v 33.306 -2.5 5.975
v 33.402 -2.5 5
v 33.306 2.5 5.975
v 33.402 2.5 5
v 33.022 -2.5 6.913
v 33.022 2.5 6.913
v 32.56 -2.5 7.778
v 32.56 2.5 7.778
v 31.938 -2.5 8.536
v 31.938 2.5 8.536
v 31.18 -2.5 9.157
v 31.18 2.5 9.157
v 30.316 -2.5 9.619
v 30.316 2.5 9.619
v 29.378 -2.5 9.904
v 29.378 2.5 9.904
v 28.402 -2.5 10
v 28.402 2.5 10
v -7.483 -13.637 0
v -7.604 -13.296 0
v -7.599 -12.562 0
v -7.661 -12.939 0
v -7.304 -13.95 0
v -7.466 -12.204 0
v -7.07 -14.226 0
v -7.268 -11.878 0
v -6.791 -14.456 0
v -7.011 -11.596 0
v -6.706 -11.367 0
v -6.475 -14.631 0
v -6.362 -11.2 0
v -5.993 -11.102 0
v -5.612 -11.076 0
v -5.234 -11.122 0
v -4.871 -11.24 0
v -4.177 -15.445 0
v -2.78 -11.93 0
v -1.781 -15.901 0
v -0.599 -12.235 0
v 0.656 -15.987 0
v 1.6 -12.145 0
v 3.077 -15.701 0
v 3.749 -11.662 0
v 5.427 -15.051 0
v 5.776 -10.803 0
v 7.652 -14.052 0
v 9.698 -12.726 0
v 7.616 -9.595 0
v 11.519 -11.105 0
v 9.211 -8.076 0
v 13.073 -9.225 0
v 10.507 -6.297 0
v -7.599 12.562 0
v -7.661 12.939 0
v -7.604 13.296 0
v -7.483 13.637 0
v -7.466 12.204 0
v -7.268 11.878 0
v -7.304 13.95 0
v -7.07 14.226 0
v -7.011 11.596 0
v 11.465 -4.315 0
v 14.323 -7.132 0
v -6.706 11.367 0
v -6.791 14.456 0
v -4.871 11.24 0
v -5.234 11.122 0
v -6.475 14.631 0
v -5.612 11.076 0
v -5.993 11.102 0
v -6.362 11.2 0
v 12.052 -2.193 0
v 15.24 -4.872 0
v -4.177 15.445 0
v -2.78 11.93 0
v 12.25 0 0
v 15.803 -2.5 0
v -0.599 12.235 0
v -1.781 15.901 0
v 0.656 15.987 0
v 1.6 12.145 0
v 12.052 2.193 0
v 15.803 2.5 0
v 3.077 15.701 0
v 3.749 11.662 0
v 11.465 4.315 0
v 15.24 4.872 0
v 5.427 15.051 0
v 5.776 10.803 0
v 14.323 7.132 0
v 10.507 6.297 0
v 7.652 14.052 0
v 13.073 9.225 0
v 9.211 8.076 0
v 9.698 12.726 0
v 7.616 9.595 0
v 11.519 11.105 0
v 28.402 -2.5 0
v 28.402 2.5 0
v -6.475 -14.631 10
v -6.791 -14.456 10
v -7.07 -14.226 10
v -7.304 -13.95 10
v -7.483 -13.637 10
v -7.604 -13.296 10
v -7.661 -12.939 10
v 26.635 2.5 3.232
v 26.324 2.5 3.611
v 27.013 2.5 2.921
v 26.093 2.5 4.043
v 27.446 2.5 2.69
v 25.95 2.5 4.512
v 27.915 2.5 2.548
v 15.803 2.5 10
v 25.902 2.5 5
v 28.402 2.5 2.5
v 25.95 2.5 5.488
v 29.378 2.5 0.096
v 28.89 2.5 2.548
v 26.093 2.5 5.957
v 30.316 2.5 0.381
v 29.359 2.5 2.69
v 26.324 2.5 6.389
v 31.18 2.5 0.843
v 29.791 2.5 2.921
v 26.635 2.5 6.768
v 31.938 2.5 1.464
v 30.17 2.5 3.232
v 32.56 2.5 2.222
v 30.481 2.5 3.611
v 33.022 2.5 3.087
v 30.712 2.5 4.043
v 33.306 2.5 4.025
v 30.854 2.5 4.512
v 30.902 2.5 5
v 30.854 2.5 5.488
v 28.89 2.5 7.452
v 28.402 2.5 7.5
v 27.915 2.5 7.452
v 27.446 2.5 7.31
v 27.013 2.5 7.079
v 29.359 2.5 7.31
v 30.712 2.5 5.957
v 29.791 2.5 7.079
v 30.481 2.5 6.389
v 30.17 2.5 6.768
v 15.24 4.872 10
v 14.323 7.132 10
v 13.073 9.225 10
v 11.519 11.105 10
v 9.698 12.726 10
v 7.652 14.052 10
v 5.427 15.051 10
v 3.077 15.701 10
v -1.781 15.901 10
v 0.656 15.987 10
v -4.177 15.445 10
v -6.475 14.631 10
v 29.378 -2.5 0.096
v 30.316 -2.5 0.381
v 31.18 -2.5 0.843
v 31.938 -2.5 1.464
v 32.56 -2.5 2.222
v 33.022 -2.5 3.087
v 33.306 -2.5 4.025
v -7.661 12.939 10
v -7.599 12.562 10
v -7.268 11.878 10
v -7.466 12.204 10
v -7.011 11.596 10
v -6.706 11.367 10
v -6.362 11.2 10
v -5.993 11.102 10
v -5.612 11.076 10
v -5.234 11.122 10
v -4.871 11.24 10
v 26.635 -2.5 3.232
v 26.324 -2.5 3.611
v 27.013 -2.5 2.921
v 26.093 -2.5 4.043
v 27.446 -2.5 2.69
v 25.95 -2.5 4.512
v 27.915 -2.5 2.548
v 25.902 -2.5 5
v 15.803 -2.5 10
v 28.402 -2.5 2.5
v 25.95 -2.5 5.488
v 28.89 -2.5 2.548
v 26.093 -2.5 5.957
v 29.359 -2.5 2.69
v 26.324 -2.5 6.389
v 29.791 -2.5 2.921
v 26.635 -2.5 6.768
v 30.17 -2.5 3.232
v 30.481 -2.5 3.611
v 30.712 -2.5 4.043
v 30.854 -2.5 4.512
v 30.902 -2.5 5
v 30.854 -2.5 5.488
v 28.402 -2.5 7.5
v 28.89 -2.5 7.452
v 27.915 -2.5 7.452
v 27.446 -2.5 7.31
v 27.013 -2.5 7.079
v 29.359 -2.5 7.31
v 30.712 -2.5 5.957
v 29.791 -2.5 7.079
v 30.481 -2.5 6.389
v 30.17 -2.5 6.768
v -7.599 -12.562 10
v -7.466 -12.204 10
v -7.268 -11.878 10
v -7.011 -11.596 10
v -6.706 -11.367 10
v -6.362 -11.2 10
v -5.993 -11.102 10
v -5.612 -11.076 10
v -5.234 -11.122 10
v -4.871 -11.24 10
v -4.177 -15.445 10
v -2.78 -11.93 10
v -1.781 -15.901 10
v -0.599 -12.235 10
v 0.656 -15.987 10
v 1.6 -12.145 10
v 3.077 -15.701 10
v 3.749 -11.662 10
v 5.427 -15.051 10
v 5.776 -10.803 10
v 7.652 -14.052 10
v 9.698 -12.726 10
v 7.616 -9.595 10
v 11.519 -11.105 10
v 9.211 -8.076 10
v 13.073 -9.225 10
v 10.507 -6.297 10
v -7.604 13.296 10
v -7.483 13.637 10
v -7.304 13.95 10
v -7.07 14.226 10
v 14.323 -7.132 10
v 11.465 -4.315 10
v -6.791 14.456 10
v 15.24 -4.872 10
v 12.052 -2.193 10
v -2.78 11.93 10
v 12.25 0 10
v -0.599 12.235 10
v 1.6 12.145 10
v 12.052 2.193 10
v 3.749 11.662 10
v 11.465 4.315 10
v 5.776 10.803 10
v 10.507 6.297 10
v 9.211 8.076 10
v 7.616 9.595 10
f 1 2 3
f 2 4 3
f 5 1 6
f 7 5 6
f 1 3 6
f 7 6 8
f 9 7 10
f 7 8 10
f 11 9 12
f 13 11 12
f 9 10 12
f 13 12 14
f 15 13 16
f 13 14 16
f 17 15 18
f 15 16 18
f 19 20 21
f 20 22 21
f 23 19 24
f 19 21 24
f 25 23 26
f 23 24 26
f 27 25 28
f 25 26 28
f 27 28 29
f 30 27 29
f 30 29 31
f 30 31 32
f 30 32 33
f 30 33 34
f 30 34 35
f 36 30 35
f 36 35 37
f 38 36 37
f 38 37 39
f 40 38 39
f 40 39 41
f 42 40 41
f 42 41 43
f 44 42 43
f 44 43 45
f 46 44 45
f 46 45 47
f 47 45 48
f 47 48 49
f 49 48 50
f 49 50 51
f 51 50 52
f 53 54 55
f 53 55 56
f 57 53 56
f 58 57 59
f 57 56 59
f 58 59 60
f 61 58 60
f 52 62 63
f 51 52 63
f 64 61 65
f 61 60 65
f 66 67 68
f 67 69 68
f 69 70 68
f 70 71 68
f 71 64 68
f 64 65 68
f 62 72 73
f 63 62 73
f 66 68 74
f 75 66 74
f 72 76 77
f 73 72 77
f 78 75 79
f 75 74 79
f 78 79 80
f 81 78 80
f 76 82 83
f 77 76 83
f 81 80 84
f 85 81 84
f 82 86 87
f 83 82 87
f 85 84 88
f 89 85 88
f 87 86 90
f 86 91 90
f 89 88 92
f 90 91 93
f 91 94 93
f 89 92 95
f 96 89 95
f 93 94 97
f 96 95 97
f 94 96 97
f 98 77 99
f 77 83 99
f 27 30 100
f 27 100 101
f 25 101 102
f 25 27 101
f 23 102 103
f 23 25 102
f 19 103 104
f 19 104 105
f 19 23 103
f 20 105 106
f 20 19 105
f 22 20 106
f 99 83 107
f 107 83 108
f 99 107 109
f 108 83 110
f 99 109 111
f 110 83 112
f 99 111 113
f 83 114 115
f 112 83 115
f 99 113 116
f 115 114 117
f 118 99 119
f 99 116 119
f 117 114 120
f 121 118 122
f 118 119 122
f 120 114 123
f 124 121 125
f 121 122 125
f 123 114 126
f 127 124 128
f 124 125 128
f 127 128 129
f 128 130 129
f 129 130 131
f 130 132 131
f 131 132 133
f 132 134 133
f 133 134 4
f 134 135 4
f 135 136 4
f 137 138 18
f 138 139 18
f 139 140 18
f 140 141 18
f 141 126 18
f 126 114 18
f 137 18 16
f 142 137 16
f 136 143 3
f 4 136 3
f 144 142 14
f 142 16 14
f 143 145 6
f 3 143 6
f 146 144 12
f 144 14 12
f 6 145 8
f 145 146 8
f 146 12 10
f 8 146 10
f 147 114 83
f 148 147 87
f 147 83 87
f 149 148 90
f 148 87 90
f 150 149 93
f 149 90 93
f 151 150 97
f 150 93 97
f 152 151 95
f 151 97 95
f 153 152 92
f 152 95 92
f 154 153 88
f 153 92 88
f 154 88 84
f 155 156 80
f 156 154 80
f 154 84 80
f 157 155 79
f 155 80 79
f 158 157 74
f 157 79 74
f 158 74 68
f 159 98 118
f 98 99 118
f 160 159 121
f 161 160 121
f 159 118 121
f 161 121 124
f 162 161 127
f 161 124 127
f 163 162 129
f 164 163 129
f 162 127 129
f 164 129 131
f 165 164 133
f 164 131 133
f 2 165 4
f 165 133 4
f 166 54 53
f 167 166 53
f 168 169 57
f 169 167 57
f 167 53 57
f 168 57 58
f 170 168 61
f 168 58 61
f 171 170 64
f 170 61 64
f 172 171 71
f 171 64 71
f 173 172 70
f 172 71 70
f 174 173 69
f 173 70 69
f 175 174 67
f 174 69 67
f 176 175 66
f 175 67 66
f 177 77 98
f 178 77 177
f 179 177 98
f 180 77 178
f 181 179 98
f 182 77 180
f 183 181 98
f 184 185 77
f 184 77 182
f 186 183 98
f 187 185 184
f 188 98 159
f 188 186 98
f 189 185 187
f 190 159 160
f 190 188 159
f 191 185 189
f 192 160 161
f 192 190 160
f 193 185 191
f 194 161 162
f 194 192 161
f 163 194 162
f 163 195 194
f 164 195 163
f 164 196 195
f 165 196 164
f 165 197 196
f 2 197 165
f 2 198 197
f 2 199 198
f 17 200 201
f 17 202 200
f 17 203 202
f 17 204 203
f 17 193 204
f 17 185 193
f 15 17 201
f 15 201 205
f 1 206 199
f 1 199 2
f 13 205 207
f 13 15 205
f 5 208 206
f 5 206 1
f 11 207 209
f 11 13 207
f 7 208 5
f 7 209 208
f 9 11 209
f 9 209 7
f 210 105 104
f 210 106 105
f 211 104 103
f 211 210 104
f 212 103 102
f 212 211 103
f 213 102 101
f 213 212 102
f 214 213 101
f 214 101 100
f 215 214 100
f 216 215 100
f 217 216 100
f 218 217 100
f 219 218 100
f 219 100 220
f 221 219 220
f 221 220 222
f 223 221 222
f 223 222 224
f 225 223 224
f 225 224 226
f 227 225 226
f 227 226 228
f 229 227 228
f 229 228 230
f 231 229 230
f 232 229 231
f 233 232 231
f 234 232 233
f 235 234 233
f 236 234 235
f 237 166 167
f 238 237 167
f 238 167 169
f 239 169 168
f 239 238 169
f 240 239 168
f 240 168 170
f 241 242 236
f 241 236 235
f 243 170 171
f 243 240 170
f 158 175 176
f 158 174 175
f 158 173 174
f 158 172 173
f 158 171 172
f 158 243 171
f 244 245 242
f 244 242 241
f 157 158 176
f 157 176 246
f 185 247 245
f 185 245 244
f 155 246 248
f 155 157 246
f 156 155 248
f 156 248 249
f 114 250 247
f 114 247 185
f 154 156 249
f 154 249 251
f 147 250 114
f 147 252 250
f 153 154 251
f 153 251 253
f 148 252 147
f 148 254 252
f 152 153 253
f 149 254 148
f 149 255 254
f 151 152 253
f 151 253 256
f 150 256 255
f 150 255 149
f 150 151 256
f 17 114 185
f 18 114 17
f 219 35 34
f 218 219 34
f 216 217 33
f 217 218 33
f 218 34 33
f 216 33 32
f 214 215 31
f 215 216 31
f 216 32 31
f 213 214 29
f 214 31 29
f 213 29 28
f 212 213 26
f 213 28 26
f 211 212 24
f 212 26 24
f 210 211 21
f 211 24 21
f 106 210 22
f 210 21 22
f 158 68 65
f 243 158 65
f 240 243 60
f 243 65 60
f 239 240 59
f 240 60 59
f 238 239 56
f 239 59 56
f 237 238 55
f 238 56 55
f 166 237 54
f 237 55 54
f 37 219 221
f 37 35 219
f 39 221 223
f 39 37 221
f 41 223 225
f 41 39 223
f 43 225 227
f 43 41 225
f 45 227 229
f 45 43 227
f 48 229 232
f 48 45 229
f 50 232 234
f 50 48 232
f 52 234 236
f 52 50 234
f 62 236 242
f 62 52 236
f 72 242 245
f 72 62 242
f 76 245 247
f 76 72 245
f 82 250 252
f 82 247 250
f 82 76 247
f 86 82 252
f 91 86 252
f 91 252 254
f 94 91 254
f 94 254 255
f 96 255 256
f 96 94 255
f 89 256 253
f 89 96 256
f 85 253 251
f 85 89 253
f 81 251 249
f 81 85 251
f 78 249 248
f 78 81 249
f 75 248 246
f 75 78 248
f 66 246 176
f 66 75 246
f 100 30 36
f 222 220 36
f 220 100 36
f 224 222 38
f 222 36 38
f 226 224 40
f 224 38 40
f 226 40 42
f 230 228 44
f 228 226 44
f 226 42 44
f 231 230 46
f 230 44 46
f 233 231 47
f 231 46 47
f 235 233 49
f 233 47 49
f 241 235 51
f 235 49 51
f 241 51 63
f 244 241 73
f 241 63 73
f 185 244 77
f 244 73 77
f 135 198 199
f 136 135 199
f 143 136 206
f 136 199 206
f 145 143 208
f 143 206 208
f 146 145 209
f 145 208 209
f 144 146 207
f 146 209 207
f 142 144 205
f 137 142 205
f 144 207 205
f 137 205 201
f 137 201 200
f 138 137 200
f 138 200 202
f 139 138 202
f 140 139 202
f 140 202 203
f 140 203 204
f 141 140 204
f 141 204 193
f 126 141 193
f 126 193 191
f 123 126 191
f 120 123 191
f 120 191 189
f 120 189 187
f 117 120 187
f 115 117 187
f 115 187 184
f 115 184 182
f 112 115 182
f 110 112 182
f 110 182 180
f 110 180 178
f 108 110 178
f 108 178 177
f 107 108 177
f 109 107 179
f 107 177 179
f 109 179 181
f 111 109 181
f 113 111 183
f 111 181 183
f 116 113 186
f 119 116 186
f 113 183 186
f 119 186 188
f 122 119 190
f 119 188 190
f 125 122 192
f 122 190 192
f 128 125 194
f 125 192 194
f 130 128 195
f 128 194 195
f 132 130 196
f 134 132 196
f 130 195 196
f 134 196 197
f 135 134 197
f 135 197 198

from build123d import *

# Parameters (mm, degrees)
F0_R        = 16
F0_R_2      = 12.25
F1_DEPTH    = 10
F2_W        = 11.453170795
F2_H        = 32.4866687879
F3_DEPTH    = 10.001
F4_T1_DEPTH = 27.6008886653
F4_T3_DEPTH = 16.6375565979
F5_W        = 20
F5_H        = 5
F6_DEPTH    = 10
F7_R        = 2.5
F8_DEPTH    = 18.501
F9_R        = 4.99999


# Not quite as in the source:
# - a fillet or chamfer that OpenCascade refuses, or shapes differently, is made with other operations: its cross-section is extruded or revolved along the edge and cut away or added
# - a fillet or chamfer is up to 0.001 mm smaller than in the source, because OpenCascade refuses the exact size


with BuildPart() as f1:
    # F0 (on Top) → F1 (new body)
    with BuildSketch(Plane.XY):
        Circle(F0_R)
        Circle(F0_R_2, mode=Mode.SUBTRACT)
    extrude(amount=F1_DEPTH)

    # F2 (on face) → F3 (cut, through all)
    with BuildSketch(Plane.XY.offset(10)):
        with Locations((-13.3922861423, 0.2399678342)):
            Rectangle(F2_W, F2_H)
    extrude(amount=-F3_DEPTH, mode=Mode.SUBTRACT)

    # F4: fillet of radius 2 on 4 edges, made by hand

    # F4_s2 → F4_t1 (cut)
    with BuildSketch(Plane.XY.offset(-8.8004443327)):
        with BuildLine():
            ThreePointArc((-7.6657007448, 13.0752565967), (-6.7633409093, 11.4033755993), (-4.8705146754, 11.2401328638))
            ThreePointArc((-4.8705146754, 11.2401328638), (-6.3244783193, 10.491114049), (-7.6657007448, 9.5550788637))
            Line((-7.6657007448, 9.5550788637), (-7.6657007448, 13.0752565967))
        make_face()
        with BuildLine():
            ThreePointArc((-4.8705146754, -11.2401328638), (-6.7633409093, -11.4033755993), (-7.6657007448, -13.0752565967))
            Line((-7.6657007448, -13.0752565967), (-7.6657007448, -9.5550788637))
            ThreePointArc((-7.6657007448, -9.5550788637), (-6.3244783193, -10.491114049), (-4.8705146754, -11.2401328638))
        make_face()
    extrude(amount=F4_T1_DEPTH, mode=Mode.SUBTRACT)

    # F4_s4 → F4_t3 (cut)
    with BuildSketch(Plane.XY.offset(-3.318778299)):
        with BuildLine():
            ThreePointArc((-6.4750865655, -14.6312423932), (-7.3418230019, -13.8934897778), (-7.6657007448, -12.8023370941))
            Line((-7.6657007448, -12.8023370941), (-7.6657007448, -14.0441102278))
            ThreePointArc((-7.6657007448, -14.0441102278), (-7.076485532, -14.3500297044), (-6.4750865655, -14.6312423932))
        make_face()
        with BuildLine():
            ThreePointArc((-6.4750865655, 14.6312423932), (-7.3418230019, 13.8934897778), (-7.6657007448, 12.8023370941))
            Line((-7.6657007448, 12.8023370941), (-7.6657007448, 14.0441102278))
            ThreePointArc((-7.6657007448, 14.0441102278), (-7.076485532, 14.3500297044), (-6.4750865655, 14.6312423932))
        make_face()
    extrude(amount=F4_T3_DEPTH, mode=Mode.SUBTRACT)

    # F5 (on face) → F6 (join)
    with BuildSketch(Plane.XY.offset(10)):
        with Locations((23.4022848308, 0)):
            Rectangle(F5_W, F5_H)
    extrude(amount=-F6_DEPTH)

    # F7 (on face) → F8 (cut, through all)
    with BuildSketch(Plane.XZ.offset(2.5)):
        with Locations((28.4022848308, 5)):
            Circle(F7_R)
    extrude(amount=-F8_DEPTH, mode=Mode.SUBTRACT)

    # F9 (radius 5 in the source; OpenCascade refuses exactly that, so slightly less here)
    f9_edges = [f1.edges().sort_by_distance(p)[0] for p in [
        (33.402285, 0, 10),
        (33.402285, 0, 0),
    ]]
    fillet(f9_edges, radius=F9_R)


solid = f1.part
